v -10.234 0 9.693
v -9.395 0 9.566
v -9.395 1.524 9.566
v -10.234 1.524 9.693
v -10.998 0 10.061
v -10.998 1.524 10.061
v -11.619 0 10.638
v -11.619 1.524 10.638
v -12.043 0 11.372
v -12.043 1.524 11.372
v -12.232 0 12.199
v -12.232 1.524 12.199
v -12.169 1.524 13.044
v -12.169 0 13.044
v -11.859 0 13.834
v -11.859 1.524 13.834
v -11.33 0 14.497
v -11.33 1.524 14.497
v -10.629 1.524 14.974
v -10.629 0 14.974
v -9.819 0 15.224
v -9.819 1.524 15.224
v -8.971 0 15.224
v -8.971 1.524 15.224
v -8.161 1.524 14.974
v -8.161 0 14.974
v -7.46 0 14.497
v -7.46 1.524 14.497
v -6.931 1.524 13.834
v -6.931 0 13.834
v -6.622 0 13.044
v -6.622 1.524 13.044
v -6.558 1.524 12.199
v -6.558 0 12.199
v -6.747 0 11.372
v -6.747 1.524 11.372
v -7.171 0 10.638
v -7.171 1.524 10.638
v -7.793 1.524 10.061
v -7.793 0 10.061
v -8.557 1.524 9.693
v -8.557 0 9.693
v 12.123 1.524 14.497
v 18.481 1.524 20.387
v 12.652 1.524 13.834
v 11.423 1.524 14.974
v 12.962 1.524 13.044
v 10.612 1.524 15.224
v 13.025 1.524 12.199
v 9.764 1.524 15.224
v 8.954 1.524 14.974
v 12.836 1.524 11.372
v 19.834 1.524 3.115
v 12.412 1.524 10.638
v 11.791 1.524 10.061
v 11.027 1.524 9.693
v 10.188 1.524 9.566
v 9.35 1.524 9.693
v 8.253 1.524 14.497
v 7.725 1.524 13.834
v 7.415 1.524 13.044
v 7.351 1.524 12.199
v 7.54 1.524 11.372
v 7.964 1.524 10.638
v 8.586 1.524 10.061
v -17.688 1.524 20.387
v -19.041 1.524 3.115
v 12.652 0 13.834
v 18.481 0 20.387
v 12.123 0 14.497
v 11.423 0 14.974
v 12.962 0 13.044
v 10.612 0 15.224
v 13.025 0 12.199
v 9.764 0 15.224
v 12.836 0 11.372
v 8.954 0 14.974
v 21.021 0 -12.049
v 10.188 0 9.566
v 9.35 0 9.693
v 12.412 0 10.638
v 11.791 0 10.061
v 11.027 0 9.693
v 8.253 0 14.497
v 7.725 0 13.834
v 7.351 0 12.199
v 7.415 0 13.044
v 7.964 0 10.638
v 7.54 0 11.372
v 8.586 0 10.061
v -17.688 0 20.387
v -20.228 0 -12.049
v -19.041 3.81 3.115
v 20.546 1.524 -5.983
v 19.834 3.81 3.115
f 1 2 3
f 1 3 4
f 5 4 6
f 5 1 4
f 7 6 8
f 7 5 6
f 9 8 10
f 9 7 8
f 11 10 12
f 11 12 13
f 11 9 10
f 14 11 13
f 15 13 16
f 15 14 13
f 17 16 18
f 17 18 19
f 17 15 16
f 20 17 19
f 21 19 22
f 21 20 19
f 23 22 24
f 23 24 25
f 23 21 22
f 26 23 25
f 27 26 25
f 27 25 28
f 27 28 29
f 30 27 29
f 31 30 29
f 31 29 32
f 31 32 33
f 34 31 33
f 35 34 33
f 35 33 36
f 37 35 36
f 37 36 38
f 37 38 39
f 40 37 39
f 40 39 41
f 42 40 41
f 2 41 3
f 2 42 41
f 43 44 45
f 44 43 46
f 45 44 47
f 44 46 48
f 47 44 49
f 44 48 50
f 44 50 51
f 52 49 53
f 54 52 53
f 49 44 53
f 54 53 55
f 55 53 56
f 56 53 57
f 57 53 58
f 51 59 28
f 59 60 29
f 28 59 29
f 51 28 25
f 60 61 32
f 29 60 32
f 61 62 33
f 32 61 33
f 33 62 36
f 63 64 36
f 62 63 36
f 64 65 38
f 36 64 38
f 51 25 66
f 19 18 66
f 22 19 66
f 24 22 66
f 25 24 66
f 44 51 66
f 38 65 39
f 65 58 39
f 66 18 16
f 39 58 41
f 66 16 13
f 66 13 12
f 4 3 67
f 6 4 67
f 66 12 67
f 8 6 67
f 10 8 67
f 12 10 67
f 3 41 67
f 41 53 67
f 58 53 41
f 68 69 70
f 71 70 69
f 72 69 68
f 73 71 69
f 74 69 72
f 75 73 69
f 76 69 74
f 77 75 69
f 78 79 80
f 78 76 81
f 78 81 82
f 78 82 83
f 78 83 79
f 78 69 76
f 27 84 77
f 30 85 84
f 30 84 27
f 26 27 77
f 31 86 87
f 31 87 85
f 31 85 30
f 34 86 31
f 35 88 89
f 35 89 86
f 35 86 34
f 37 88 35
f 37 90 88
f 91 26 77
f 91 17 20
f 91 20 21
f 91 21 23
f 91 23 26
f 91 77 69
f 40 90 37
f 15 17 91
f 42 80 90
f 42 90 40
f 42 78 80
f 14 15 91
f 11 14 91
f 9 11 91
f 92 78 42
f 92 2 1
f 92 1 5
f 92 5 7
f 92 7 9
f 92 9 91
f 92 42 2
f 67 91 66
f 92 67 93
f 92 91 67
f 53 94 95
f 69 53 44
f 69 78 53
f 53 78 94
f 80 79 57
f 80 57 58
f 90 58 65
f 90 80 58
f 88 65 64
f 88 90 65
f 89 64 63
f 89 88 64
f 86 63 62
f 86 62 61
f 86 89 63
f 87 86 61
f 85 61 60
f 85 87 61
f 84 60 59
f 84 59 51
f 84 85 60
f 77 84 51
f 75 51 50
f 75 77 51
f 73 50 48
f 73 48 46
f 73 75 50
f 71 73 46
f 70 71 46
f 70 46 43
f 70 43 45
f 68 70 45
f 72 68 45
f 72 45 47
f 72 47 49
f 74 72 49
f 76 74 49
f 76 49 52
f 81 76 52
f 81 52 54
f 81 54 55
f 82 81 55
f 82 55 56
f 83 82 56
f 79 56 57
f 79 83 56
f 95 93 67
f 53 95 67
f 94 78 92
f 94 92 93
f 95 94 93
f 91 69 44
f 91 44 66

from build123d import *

# Parameters (mm, degrees)
SKETCH1_R                       = 2.8448
BOSS_EXTRUDE1_DEPTH             = 1.524
BOSS_EXTRUDE2_REACH             = 31.04
BOSS_EXTRUDE2_DIRECTION_2_REACH = 31.04
CUT_EXTRUDE1_REACH              = 31.249
CUT_EXTRUDE1_DIRECTION_2_REACH  = 31.249


with BuildPart() as part:
    # Sketch1 → Boss-Extrude1 (new body)
    with BuildSketch(Plane(origin=(0, 0, 0), x_dir=(1, 0, 0), z_dir=(0, 1, 0))):
        Polygon((-20.228169231, 12.048978462), (21.021430769, 12.048978462), (18.481430769, -20.386821538), (-17.688169231, -20.386821538), align=None)
        with Locations(Location((-9.395069231, -12.411221538, 0), (0, 0, 90))):
            Circle(SKETCH1_R, mode=Mode.SUBTRACT)
        with Locations(Location((10.188330769, -12.411221538, 0), (0, 0, 90))):
            Circle(SKETCH1_R, mode=Mode.SUBTRACT)
    extrude(amount=BOSS_EXTRUDE1_DEPTH)

    # Boss-Extrude2: up to this plane
    boss_extrude2_end = Plane(origin=(19.95552113, 1.524, 1.562687637), z_dir=(-0.9969479165233839, 0, -0.07806953144270824))
    # Sketch4 → Boss-Extrude2 (add, up to the surface)
    with BuildSketch(Plane(origin=(0.396630769, 0, 0), x_dir=(0, 0, -1), z_dir=(1, 0, 0)), mode=Mode.PRIVATE) as boss_extrude2_sk1:
        Polygon((-3.114821538, 3.81), (-3.114821538, 1.524), (5.983458462, 1.524), align=None)
    boss_extrude2_tool1 = split(extrude(boss_extrude2_sk1.sketch, amount=BOSS_EXTRUDE2_REACH, mode=Mode.PRIVATE), bisect_by=boss_extrude2_end, keep=Keep.BOTH, mode=Mode.PRIVATE)
    add(boss_extrude2_tool1.solids().sort_by_distance((0.396631, 2.286, 0.082062))[0])

    # Boss-Extrude2 direction 2: up to this plane
    boss_extrude2_direction_2_end = Plane(origin=(-19.167094403, 1.524, 1.500947095), z_dir=(-0.9969479165233839, 0, 0.07806953144270846))
    # Sketch4 → Boss-Extrude2 direction 2 (add, up to the surface)
    with BuildSketch(Plane(origin=(0.396630769, 0, 0), x_dir=(0, 0, -1), z_dir=(1, 0, 0)), mode=Mode.PRIVATE) as boss_extrude2_direction_2_sk1:
        Polygon((-3.114821538, 3.81), (-3.114821538, 1.524), (5.983458462, 1.524), align=None)
    boss_extrude2_direction_2_tool1 = split(extrude(boss_extrude2_direction_2_sk1.sketch, amount=-BOSS_EXTRUDE2_DIRECTION_2_REACH, mode=Mode.PRIVATE), bisect_by=boss_extrude2_direction_2_end, keep=Keep.BOTH, mode=Mode.PRIVATE)
    add(boss_extrude2_direction_2_tool1.solids().sort_by_distance((0.396631, 2.286, 0.082062))[0])

    # Cut-Extrude1: up to this face of the body (flat: up to its plane)
    cut_extrude1_end = Plane(part.part.faces().sort_by_distance((-19.01379481, 1.026887005, 3.458582885))[0])
    # Sketch4<3> → Cut-Extrude1 (cut, up to the picked face)
    with BuildSketch(Plane(origin=(0.396630769, 0, 0), x_dir=(0, 0, -1), z_dir=(1, 0, 0)), mode=Mode.PRIVATE) as cut_extrude1_sk1:
        Polygon((12.048978462, 1.524), (5.983458462, 1.524), (12.048978462, 0), align=None)
    cut_extrude1_tool1 = split(extrude(cut_extrude1_sk1.sketch, amount=-CUT_EXTRUDE1_REACH, mode=Mode.PRIVATE), bisect_by=cut_extrude1_end, keep=Keep.BOTH, mode=Mode.PRIVATE)
    add(cut_extrude1_tool1.solids().sort_by(Axis((0.396631, 1.016, -10.027138), (-1, 0, 0)))[0], mode=Mode.SUBTRACT)

    # Cut-Extrude1 direction 2: up to this face of the body (flat: up to its plane)
    cut_extrude1_direction_2_end = Plane(part.part.faces().sort_by_distance((19.807056349, 1.026887005, 3.458582885))[0])
    # Sketch4<3> → Cut-Extrude1 direction 2 (cut, up to the picked face)
    with BuildSketch(Plane(origin=(0.396630769, 0, 0), x_dir=(0, 0, -1), z_dir=(1, 0, 0)), mode=Mode.PRIVATE) as cut_extrude1_direction_2_sk1:
        Polygon((12.048978462, 1.524), (5.983458462, 1.524), (12.048978462, 0), align=None)
    cut_extrude1_direction_2_tool1 = split(extrude(cut_extrude1_direction_2_sk1.sketch, amount=CUT_EXTRUDE1_DIRECTION_2_REACH, mode=Mode.PRIVATE), bisect_by=cut_extrude1_direction_2_end, keep=Keep.BOTH, mode=Mode.PRIVATE)
    add(cut_extrude1_direction_2_tool1.solids().sort_by(Axis((0.396631, 1.016, -10.027138), (1, 0, 0)))[0], mode=Mode.SUBTRACT)


solid = part.part
